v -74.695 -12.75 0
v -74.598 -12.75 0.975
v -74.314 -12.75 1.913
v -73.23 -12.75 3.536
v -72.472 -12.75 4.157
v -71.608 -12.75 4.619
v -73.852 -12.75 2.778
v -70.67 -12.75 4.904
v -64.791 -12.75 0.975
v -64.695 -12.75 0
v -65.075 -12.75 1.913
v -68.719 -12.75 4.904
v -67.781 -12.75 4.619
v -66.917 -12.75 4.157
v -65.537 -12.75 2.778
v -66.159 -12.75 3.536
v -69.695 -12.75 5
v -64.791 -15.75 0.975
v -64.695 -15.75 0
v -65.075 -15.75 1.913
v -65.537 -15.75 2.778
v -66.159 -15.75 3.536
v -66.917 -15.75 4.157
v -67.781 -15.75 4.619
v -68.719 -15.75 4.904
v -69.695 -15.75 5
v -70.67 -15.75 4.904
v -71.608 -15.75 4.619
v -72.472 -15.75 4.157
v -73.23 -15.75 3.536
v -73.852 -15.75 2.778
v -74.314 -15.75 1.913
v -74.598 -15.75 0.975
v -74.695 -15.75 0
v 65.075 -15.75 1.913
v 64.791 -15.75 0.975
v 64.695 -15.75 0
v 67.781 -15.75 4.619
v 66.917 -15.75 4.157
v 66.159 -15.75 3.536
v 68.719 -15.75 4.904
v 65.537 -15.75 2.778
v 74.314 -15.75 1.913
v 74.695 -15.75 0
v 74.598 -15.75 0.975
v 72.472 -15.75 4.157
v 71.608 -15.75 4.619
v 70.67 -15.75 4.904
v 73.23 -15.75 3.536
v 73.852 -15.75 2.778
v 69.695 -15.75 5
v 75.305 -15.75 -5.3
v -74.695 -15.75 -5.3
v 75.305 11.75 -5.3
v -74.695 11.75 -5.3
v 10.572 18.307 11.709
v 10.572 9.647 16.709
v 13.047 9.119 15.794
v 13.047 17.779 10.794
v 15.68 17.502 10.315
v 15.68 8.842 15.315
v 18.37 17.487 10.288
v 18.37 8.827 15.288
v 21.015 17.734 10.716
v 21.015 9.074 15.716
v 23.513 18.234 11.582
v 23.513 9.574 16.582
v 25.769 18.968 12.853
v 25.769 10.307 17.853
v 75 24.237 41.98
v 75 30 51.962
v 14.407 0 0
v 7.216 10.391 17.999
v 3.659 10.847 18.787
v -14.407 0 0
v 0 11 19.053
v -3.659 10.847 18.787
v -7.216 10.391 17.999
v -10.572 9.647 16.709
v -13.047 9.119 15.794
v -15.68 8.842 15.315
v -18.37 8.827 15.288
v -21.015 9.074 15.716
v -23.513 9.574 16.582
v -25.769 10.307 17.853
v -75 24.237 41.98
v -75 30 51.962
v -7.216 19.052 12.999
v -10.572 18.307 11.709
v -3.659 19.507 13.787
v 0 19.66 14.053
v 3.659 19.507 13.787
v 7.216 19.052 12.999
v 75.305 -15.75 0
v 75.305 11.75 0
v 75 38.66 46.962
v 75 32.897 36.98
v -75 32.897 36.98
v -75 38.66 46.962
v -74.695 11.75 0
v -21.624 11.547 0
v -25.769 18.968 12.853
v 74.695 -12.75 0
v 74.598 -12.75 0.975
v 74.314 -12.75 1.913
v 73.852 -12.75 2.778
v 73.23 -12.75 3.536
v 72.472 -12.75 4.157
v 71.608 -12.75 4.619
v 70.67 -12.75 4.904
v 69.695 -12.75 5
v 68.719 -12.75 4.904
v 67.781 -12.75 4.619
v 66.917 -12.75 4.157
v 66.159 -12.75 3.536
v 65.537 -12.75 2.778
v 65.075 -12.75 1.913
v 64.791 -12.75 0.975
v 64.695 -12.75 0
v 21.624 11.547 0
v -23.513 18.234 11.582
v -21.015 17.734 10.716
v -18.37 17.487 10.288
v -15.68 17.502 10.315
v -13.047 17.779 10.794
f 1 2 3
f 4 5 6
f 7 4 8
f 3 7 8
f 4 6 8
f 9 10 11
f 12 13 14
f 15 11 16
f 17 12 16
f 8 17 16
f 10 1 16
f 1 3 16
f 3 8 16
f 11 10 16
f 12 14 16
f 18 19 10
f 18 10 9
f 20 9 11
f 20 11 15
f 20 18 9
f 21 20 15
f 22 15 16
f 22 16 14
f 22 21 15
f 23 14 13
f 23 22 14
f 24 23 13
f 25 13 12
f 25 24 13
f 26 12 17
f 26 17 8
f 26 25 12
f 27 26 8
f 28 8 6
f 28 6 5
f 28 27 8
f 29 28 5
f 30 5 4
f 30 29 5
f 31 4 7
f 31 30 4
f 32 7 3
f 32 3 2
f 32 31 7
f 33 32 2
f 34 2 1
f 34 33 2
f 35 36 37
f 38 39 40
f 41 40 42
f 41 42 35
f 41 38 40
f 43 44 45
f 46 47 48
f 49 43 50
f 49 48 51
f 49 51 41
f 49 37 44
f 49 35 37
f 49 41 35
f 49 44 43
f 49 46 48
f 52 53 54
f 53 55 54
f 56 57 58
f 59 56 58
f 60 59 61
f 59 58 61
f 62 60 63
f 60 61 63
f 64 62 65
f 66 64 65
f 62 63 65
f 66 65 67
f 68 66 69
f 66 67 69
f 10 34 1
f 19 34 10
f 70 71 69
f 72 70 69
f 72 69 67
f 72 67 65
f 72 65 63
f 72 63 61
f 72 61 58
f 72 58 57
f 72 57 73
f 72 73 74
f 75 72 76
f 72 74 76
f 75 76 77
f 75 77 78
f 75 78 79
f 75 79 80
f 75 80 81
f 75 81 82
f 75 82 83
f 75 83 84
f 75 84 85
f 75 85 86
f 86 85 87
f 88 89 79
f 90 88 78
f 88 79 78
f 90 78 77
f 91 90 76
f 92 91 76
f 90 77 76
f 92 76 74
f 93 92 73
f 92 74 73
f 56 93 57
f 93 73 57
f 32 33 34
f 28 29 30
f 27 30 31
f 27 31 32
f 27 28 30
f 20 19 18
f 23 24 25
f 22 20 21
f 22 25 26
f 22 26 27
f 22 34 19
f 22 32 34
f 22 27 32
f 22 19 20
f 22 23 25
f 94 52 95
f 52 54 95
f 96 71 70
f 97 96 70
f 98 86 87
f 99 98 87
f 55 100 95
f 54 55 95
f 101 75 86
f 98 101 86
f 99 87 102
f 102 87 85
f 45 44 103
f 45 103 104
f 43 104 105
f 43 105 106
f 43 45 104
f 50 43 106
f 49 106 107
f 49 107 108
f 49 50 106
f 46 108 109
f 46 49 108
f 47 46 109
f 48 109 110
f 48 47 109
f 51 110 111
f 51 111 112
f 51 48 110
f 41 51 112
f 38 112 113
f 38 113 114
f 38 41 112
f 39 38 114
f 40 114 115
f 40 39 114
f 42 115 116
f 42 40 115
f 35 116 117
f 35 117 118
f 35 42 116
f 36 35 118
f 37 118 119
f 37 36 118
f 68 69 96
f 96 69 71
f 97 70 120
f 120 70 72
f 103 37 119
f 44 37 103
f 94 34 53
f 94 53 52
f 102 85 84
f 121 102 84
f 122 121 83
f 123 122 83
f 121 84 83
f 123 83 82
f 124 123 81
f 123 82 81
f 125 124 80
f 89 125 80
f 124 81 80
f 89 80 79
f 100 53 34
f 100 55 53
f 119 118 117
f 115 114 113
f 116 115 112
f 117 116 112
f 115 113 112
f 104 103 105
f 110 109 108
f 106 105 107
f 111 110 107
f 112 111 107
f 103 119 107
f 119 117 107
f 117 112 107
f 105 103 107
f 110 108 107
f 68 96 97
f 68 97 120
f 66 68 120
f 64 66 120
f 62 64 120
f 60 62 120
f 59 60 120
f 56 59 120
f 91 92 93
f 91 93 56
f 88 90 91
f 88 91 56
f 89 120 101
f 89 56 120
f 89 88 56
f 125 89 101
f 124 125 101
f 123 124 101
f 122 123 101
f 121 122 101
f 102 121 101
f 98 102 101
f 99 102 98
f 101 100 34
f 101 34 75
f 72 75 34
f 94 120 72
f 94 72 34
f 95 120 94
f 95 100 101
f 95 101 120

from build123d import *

# Parameters (mm, degrees)
F3_DEPTH = 10
F4_W     = 150
F4_H     = 5.3
F5_DEPTH = 11.75
F6_W     = 150
F6_H     = 5.3
F7_DEPTH = 4
F9_DEPTH = 3


with BuildPart() as f3:
    # F2 (on face) → F3 (new body)
    with BuildSketch(Plane(origin=(0, 0, 0), x_dir=(-1, 0, 0), z_dir=(0, 0.8660254038, -0.5))):
        with BuildLine():
            ThreePointArc((-10.5717623432, 19.2934662764), (-18.3702710328, 17.6535746114), (-25.7686707116, 20.6149365693))
            Line((-25.7686707116, 20.6149365693), (-75, 60))
            Line((-75, 60), (-75, 48.4743763726))
            Line((-75, 48.4743763726), (-14.4070295342, 0))
            Line((-14.4070295342, 0), (0, 0))
            Line((0, 0), (14.4070295342, 0))
            Line((14.4070295342, 0), (75, 48.4743763726))
            Line((75, 48.4743763726), (75, 60))
            Line((75, 60), (25.7686707116, 20.6149365693))
            ThreePointArc((25.7686707116, 20.6149365693), (18.3702710328, 17.6535746114), (10.5717623432, 19.2934662764))
            ThreePointArc((10.5717623432, 19.2934662764), (0, 22), (-10.5717623432, 19.2934662764))
        make_face()
    extrude(amount=F3_DEPTH)

    # F4 (on Front) → F5 (join, symmetric)
    with BuildSketch(Plane.XZ):
        with Locations((0.3054966368, -2.65)):
            Rectangle(F4_W, F4_H)
    extrude(amount=F5_DEPTH, both=True)

    # F6 (on face) → F7 (join)
    with BuildSketch(Plane.XZ.offset(11.75)):
        with Locations((0.3054966368, -2.65)):
            Rectangle(F6_W, F6_H)
    extrude(amount=F7_DEPTH)


with BuildPart() as f9:
    # F8 (on face) → F9 (new body)
    with BuildSketch(Plane.XZ.offset(15.75)):
        with BuildLine():
            ThreePointArc((-64.6945033632, 0), (-69.6945033632, 5), (-74.6945033632, 0))
            Line((-74.6945033632, 0), (-64.6945033632, 0))
        make_face()
    extrude(amount=-F9_DEPTH)


with BuildPart() as f9b:
    # F8 (on face) → F9, piece 2 (new body)
    with BuildSketch(Plane.XZ.offset(15.75)):
        with BuildLine():
            ThreePointArc((74.6945033632, 0), (69.6945033632, 5), (64.6945033632, 0))
            Line((64.6945033632, 0), (74.6945033632, 0))
        make_face()
    extrude(amount=-F9_DEPTH)


solid = Compound([f3.part, f9.part, f9b.part])
